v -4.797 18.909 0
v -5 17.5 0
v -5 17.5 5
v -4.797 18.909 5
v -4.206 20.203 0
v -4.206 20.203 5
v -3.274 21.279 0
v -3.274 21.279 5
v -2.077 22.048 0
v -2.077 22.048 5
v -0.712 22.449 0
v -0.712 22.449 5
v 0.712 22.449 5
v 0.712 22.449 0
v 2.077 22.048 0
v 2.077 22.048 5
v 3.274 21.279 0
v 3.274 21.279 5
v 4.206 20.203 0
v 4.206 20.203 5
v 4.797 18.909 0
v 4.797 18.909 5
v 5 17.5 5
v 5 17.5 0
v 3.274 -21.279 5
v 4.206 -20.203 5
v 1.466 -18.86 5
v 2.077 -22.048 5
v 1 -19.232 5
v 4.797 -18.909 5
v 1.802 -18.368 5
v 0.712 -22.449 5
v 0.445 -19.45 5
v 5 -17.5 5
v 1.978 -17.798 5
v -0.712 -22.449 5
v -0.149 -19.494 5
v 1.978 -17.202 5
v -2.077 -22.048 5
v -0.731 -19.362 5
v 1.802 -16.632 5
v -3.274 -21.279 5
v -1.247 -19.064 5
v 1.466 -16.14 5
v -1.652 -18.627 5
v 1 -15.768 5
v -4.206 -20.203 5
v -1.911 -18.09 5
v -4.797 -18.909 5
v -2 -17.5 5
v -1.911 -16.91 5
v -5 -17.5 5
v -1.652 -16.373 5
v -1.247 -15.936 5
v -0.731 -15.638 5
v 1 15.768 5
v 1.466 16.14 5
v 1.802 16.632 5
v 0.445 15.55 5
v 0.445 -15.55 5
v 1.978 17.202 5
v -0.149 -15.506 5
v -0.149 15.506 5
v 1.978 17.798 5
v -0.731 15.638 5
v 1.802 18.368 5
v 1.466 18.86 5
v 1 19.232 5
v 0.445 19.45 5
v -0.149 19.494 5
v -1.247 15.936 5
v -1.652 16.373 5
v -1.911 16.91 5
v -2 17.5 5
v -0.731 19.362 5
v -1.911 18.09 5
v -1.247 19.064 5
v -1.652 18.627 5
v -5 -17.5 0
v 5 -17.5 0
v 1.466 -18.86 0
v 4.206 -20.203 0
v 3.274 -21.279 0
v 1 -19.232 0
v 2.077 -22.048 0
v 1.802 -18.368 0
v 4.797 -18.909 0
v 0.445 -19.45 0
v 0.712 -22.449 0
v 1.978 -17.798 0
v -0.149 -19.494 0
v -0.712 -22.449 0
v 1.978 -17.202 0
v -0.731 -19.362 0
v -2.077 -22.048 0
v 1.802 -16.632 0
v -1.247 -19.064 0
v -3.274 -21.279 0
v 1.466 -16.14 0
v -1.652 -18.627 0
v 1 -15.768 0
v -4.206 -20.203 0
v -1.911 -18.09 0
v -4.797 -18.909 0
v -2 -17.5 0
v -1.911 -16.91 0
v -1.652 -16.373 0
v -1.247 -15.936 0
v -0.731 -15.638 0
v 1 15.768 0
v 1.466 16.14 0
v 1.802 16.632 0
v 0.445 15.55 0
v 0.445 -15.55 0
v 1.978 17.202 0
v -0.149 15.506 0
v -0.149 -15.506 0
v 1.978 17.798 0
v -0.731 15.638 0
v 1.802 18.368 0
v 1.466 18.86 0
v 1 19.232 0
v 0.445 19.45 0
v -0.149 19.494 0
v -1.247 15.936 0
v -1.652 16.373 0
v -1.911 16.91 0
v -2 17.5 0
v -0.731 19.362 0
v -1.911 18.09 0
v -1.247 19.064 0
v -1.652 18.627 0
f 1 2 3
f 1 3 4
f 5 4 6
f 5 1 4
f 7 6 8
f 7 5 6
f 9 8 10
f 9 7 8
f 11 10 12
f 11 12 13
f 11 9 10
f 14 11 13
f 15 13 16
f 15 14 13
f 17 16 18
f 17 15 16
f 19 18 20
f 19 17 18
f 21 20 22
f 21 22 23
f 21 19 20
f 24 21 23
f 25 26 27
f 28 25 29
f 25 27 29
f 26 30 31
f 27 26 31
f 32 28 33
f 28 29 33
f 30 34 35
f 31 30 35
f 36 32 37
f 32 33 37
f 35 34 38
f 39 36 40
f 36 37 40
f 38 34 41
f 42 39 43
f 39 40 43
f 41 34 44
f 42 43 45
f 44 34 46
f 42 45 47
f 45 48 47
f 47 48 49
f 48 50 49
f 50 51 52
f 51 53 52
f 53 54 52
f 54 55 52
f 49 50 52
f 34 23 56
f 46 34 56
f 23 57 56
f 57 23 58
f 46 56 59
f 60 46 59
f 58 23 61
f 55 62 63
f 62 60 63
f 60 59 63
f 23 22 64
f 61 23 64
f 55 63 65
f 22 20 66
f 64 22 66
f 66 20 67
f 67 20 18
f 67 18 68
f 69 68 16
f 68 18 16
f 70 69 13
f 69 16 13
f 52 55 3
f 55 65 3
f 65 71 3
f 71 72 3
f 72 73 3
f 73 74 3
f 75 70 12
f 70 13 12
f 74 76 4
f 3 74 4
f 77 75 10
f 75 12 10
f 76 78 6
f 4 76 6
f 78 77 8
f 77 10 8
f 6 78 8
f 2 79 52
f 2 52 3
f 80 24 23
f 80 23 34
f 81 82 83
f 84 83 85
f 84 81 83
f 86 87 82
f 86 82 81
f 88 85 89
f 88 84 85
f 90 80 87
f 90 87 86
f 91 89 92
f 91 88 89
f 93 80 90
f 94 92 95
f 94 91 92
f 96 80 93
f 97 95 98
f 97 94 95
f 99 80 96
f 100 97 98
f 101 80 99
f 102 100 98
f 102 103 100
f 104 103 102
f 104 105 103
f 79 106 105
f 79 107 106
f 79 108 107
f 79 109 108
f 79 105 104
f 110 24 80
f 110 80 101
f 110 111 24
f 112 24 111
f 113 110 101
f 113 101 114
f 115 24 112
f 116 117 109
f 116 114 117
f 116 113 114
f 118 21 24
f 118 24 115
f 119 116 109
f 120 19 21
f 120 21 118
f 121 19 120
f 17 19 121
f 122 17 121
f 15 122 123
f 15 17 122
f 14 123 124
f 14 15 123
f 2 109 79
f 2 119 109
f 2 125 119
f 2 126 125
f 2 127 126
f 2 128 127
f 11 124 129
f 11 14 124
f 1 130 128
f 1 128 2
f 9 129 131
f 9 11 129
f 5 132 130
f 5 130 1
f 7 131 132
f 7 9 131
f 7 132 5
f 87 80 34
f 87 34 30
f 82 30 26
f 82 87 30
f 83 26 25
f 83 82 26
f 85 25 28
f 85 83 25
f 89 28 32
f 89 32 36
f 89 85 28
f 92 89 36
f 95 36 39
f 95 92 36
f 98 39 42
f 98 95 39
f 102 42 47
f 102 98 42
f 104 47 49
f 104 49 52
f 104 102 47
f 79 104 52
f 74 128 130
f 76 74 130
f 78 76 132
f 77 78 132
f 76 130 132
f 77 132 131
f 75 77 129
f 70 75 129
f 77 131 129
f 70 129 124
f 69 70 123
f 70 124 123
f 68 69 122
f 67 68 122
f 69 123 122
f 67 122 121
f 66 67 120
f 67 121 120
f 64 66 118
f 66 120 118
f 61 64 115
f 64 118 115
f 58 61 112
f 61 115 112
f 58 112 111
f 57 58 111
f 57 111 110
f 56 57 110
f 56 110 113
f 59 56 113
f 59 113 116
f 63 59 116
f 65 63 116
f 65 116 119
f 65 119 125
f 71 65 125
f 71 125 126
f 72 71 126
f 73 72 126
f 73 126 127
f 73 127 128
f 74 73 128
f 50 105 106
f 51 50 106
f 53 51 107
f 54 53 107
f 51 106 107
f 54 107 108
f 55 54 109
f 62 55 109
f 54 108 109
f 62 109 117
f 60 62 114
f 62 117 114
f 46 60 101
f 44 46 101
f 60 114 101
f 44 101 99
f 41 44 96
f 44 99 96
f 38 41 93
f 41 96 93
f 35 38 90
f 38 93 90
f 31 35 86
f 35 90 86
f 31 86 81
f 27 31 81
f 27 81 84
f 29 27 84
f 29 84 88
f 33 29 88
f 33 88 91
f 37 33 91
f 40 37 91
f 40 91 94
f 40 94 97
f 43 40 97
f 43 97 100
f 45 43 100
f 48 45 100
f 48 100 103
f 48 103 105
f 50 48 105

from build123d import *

# Parameters (mm, degrees)
BOSS_EXTRUDE1_DEPTH   = 5
F_4_0MM_DOWEL_HOLE1_D = 4


with BuildPart() as part:
    # Sketch1 → Boss-Extrude1 (new body)
    with BuildSketch(Plane.XY):
        with BuildLine():
            Line((5, 17.5), (5, -17.5))
            ThreePointArc((5, -17.5), (0, -22.5), (-5, -17.5))
            Line((-5, -17.5), (-5, 17.5))
            ThreePointArc((-5, 17.5), (0, 22.5), (5, 17.5))
        make_face()
    extrude(amount=BOSS_EXTRUDE1_DEPTH)

    # Ø4.0mm Dowel Hole1 (through all)
    with Locations(Plane.XY.offset(5)):
        with Locations((0, 17.5), (0, -17.5)):
            Hole(F_4_0MM_DOWEL_HOLE1_D / 2)


solid = part.part
